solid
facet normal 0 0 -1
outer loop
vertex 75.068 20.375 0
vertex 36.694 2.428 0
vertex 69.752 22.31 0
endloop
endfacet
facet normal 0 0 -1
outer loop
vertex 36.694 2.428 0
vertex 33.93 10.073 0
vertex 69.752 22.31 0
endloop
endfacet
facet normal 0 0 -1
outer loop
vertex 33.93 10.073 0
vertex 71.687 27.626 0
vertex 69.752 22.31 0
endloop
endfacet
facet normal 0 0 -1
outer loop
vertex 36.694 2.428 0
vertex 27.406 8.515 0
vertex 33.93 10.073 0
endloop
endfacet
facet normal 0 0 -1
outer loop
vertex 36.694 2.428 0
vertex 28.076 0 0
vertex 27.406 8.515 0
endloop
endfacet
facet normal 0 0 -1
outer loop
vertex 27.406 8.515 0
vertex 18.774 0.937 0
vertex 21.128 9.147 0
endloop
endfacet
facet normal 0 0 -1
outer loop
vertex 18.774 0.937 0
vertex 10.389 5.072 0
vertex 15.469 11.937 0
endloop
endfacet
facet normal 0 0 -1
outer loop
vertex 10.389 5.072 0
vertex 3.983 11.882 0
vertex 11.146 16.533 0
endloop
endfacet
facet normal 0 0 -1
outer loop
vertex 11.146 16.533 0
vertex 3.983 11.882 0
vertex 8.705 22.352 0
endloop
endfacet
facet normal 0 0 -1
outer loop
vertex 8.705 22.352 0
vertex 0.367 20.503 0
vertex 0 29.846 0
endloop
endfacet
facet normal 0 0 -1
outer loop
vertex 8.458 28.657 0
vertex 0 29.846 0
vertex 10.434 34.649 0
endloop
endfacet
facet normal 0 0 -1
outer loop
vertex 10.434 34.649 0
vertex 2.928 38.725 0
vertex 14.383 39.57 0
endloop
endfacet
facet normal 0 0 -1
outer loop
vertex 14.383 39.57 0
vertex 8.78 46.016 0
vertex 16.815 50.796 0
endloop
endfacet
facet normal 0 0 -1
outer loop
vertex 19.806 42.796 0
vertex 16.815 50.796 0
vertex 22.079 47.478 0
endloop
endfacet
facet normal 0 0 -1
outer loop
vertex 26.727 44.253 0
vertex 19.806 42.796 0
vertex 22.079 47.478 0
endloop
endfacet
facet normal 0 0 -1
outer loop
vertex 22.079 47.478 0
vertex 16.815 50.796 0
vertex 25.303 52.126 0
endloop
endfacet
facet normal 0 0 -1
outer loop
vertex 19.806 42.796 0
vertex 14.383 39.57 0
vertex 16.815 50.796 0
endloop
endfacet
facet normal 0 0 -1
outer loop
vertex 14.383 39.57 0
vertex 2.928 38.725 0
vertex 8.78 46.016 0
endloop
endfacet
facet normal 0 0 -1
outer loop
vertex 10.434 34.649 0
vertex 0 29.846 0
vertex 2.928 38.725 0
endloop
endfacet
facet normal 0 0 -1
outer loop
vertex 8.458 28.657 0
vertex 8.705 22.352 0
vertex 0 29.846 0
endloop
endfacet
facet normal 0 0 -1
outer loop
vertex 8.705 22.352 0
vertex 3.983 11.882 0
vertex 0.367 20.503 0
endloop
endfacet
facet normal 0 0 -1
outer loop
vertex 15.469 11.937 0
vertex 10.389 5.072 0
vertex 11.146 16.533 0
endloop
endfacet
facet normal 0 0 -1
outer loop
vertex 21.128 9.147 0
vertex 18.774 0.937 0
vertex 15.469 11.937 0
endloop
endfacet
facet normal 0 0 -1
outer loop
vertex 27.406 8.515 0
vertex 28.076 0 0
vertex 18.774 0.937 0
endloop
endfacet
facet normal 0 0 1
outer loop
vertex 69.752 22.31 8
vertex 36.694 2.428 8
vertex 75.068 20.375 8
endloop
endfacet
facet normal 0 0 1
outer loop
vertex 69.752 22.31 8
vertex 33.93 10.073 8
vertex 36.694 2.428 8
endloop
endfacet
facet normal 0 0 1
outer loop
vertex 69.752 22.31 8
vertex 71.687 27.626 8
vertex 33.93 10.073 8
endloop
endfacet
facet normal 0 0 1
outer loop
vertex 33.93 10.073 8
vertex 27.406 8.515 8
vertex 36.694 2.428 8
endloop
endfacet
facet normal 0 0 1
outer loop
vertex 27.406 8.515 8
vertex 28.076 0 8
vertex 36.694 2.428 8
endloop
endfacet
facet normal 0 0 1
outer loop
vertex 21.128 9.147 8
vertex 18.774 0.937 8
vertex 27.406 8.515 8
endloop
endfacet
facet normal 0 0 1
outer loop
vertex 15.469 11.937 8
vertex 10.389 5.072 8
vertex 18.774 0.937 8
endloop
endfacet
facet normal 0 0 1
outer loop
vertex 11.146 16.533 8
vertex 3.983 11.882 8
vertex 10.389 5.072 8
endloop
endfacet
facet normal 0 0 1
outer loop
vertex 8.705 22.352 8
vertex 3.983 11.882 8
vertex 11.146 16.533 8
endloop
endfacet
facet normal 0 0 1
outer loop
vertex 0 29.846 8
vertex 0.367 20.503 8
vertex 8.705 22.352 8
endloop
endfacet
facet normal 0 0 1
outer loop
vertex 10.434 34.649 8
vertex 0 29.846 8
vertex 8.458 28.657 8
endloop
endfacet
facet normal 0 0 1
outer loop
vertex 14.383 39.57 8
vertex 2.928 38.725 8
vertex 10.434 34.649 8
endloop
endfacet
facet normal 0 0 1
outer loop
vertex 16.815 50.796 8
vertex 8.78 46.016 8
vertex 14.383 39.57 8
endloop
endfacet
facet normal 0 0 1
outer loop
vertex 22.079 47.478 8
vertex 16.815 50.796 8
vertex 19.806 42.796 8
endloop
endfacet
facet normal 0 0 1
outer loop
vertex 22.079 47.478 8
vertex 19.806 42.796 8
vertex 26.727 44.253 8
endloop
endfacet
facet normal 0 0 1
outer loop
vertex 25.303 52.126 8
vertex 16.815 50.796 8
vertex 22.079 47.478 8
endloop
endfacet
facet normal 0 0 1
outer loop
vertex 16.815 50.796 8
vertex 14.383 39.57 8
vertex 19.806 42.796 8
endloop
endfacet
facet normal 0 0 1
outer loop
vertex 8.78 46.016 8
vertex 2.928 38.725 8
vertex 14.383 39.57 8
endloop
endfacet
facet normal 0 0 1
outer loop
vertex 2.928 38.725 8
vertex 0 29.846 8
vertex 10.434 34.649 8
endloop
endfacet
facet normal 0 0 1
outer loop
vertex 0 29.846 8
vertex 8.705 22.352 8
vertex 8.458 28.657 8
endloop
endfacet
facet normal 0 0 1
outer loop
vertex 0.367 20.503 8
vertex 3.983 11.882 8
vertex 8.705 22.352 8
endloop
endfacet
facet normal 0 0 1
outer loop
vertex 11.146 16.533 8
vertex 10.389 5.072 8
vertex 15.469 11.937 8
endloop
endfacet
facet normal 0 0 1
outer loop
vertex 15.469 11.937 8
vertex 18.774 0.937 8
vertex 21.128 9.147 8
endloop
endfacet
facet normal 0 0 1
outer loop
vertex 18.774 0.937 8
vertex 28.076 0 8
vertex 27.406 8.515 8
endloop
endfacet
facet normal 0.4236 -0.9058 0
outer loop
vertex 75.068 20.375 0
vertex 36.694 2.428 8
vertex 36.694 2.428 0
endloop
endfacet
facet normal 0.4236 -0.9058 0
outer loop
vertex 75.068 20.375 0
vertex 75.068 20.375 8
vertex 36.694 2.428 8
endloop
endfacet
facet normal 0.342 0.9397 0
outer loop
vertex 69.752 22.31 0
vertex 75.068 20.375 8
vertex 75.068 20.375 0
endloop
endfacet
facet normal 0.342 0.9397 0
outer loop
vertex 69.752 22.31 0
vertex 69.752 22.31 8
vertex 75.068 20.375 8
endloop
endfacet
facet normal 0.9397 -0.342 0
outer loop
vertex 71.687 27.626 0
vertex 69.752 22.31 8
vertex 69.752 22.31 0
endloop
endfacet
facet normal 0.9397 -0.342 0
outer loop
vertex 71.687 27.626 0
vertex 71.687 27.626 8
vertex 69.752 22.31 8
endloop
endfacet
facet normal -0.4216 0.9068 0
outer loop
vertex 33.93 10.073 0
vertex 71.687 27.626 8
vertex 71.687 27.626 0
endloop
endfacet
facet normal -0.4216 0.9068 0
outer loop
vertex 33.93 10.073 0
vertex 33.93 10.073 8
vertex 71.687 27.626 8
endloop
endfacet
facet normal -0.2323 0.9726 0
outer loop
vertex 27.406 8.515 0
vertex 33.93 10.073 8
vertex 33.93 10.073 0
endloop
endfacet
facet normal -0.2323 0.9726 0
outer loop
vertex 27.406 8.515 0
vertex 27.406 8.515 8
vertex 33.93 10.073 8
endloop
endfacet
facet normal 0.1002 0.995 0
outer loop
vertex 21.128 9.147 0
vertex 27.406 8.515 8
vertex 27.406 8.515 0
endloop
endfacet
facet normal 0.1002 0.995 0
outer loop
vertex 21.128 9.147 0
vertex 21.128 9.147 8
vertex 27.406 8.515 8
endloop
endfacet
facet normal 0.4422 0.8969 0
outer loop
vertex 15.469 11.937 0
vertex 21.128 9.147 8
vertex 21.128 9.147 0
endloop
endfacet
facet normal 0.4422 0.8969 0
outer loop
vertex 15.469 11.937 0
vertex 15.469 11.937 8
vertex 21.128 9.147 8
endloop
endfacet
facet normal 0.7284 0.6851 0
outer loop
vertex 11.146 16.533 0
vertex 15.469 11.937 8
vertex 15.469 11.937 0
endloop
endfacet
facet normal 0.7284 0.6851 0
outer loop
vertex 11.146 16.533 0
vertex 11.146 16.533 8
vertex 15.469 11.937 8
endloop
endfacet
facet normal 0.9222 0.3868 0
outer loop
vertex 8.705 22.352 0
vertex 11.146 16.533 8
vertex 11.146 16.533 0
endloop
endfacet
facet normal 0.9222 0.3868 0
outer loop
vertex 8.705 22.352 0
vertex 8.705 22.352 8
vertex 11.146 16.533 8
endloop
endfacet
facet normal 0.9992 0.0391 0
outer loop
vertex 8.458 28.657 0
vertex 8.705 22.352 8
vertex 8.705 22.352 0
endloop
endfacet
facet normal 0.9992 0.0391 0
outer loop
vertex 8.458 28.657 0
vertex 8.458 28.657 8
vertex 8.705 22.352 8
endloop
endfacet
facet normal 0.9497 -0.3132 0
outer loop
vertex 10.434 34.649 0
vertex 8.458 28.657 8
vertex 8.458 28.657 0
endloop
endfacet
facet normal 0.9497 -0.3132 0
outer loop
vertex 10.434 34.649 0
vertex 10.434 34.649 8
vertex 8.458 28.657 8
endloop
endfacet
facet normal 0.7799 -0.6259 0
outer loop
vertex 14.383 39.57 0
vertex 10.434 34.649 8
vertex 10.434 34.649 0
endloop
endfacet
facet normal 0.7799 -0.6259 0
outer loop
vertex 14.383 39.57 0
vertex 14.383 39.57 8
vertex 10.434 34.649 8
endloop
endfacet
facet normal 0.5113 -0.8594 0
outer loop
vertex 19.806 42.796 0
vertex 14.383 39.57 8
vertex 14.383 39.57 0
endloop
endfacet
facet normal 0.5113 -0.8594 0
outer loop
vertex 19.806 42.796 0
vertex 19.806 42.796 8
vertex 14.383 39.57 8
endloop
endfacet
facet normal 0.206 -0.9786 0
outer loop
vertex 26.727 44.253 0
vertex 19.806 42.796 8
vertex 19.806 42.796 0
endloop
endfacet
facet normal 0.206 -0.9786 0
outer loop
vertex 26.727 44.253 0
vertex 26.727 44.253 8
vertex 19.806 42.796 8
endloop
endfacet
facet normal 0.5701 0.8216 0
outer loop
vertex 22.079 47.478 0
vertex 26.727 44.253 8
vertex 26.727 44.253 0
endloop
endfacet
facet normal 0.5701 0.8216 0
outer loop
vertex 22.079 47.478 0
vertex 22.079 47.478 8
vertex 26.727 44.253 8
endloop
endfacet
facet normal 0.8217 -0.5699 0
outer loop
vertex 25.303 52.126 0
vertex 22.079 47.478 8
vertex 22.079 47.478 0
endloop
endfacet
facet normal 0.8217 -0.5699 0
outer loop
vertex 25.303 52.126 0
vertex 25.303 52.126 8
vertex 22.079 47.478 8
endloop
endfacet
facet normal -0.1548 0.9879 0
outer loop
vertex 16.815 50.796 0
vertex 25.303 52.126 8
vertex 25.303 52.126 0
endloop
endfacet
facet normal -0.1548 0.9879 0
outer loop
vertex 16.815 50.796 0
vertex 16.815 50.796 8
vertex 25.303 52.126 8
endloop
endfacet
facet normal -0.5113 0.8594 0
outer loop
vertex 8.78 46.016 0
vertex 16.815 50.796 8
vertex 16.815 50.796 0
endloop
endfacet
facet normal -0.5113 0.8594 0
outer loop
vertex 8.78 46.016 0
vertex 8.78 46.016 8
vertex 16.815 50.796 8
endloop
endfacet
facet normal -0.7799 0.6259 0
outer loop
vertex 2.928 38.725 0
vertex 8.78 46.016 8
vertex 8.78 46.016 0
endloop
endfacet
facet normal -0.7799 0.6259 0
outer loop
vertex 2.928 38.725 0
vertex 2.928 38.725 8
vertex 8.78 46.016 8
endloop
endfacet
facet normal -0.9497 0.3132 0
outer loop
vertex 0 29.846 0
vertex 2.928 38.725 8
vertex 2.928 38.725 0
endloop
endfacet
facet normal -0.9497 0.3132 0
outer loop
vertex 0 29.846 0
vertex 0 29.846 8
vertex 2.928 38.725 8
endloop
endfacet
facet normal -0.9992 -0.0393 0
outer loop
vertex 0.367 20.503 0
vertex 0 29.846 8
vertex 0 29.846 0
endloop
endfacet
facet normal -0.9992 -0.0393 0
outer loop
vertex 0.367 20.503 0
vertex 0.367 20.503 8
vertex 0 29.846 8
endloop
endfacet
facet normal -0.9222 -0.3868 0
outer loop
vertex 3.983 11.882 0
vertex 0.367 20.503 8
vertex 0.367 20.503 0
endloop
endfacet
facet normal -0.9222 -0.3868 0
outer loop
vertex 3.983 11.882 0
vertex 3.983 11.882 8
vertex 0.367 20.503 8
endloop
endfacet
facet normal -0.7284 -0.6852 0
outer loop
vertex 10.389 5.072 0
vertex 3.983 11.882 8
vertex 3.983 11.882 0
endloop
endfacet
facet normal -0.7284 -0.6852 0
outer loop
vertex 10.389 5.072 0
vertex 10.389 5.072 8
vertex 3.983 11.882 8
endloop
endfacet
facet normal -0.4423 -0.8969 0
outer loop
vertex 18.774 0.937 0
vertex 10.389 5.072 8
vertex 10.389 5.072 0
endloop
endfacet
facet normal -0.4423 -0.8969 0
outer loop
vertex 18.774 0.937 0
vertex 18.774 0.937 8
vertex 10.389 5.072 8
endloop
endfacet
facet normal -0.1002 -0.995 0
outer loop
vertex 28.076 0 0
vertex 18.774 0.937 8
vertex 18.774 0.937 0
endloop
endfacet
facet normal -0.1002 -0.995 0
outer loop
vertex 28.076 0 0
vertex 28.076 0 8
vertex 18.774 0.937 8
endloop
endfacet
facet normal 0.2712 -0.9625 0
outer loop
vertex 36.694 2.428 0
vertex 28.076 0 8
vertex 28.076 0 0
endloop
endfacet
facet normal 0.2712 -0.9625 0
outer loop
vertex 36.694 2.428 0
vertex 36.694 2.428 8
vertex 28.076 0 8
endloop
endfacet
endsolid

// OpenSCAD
$fn = 32;

// ----------------------------------------------------------------------
// Hook plate: curl radius 22 mm over 205 degrees, 8 mm thick band
// ----------------------------------------------------------------------

// --- parameters (mm) ---
profile_height = 8;       // extrusion height
profile_points = 26;      // points of the closed outline

profile = [[22.079, 47.478], [25.303, 52.126], [16.815, 50.796], [8.78, 46.016], [2.928, 38.725], [0, 29.846], [0.367, 20.503], [3.983, 11.882], [10.389, 5.072], [18.774, 0.937], [28.076, 0], [36.694, 2.428], [75.068, 20.375], [69.752, 22.31], [71.687, 27.626], [33.93, 10.073], [27.406, 8.515], [21.128, 9.147], [15.469, 11.937], [11.146, 16.533], [8.705, 22.352], [8.458, 28.657], [10.434, 34.649], [14.383, 39.57], [19.806, 42.796], [26.727, 44.253]];  // single closed polygon, 26 points, counter clockwise

// --- the one profile operation ---
linear_extrude(height = profile_height) polygon(points = profile);
